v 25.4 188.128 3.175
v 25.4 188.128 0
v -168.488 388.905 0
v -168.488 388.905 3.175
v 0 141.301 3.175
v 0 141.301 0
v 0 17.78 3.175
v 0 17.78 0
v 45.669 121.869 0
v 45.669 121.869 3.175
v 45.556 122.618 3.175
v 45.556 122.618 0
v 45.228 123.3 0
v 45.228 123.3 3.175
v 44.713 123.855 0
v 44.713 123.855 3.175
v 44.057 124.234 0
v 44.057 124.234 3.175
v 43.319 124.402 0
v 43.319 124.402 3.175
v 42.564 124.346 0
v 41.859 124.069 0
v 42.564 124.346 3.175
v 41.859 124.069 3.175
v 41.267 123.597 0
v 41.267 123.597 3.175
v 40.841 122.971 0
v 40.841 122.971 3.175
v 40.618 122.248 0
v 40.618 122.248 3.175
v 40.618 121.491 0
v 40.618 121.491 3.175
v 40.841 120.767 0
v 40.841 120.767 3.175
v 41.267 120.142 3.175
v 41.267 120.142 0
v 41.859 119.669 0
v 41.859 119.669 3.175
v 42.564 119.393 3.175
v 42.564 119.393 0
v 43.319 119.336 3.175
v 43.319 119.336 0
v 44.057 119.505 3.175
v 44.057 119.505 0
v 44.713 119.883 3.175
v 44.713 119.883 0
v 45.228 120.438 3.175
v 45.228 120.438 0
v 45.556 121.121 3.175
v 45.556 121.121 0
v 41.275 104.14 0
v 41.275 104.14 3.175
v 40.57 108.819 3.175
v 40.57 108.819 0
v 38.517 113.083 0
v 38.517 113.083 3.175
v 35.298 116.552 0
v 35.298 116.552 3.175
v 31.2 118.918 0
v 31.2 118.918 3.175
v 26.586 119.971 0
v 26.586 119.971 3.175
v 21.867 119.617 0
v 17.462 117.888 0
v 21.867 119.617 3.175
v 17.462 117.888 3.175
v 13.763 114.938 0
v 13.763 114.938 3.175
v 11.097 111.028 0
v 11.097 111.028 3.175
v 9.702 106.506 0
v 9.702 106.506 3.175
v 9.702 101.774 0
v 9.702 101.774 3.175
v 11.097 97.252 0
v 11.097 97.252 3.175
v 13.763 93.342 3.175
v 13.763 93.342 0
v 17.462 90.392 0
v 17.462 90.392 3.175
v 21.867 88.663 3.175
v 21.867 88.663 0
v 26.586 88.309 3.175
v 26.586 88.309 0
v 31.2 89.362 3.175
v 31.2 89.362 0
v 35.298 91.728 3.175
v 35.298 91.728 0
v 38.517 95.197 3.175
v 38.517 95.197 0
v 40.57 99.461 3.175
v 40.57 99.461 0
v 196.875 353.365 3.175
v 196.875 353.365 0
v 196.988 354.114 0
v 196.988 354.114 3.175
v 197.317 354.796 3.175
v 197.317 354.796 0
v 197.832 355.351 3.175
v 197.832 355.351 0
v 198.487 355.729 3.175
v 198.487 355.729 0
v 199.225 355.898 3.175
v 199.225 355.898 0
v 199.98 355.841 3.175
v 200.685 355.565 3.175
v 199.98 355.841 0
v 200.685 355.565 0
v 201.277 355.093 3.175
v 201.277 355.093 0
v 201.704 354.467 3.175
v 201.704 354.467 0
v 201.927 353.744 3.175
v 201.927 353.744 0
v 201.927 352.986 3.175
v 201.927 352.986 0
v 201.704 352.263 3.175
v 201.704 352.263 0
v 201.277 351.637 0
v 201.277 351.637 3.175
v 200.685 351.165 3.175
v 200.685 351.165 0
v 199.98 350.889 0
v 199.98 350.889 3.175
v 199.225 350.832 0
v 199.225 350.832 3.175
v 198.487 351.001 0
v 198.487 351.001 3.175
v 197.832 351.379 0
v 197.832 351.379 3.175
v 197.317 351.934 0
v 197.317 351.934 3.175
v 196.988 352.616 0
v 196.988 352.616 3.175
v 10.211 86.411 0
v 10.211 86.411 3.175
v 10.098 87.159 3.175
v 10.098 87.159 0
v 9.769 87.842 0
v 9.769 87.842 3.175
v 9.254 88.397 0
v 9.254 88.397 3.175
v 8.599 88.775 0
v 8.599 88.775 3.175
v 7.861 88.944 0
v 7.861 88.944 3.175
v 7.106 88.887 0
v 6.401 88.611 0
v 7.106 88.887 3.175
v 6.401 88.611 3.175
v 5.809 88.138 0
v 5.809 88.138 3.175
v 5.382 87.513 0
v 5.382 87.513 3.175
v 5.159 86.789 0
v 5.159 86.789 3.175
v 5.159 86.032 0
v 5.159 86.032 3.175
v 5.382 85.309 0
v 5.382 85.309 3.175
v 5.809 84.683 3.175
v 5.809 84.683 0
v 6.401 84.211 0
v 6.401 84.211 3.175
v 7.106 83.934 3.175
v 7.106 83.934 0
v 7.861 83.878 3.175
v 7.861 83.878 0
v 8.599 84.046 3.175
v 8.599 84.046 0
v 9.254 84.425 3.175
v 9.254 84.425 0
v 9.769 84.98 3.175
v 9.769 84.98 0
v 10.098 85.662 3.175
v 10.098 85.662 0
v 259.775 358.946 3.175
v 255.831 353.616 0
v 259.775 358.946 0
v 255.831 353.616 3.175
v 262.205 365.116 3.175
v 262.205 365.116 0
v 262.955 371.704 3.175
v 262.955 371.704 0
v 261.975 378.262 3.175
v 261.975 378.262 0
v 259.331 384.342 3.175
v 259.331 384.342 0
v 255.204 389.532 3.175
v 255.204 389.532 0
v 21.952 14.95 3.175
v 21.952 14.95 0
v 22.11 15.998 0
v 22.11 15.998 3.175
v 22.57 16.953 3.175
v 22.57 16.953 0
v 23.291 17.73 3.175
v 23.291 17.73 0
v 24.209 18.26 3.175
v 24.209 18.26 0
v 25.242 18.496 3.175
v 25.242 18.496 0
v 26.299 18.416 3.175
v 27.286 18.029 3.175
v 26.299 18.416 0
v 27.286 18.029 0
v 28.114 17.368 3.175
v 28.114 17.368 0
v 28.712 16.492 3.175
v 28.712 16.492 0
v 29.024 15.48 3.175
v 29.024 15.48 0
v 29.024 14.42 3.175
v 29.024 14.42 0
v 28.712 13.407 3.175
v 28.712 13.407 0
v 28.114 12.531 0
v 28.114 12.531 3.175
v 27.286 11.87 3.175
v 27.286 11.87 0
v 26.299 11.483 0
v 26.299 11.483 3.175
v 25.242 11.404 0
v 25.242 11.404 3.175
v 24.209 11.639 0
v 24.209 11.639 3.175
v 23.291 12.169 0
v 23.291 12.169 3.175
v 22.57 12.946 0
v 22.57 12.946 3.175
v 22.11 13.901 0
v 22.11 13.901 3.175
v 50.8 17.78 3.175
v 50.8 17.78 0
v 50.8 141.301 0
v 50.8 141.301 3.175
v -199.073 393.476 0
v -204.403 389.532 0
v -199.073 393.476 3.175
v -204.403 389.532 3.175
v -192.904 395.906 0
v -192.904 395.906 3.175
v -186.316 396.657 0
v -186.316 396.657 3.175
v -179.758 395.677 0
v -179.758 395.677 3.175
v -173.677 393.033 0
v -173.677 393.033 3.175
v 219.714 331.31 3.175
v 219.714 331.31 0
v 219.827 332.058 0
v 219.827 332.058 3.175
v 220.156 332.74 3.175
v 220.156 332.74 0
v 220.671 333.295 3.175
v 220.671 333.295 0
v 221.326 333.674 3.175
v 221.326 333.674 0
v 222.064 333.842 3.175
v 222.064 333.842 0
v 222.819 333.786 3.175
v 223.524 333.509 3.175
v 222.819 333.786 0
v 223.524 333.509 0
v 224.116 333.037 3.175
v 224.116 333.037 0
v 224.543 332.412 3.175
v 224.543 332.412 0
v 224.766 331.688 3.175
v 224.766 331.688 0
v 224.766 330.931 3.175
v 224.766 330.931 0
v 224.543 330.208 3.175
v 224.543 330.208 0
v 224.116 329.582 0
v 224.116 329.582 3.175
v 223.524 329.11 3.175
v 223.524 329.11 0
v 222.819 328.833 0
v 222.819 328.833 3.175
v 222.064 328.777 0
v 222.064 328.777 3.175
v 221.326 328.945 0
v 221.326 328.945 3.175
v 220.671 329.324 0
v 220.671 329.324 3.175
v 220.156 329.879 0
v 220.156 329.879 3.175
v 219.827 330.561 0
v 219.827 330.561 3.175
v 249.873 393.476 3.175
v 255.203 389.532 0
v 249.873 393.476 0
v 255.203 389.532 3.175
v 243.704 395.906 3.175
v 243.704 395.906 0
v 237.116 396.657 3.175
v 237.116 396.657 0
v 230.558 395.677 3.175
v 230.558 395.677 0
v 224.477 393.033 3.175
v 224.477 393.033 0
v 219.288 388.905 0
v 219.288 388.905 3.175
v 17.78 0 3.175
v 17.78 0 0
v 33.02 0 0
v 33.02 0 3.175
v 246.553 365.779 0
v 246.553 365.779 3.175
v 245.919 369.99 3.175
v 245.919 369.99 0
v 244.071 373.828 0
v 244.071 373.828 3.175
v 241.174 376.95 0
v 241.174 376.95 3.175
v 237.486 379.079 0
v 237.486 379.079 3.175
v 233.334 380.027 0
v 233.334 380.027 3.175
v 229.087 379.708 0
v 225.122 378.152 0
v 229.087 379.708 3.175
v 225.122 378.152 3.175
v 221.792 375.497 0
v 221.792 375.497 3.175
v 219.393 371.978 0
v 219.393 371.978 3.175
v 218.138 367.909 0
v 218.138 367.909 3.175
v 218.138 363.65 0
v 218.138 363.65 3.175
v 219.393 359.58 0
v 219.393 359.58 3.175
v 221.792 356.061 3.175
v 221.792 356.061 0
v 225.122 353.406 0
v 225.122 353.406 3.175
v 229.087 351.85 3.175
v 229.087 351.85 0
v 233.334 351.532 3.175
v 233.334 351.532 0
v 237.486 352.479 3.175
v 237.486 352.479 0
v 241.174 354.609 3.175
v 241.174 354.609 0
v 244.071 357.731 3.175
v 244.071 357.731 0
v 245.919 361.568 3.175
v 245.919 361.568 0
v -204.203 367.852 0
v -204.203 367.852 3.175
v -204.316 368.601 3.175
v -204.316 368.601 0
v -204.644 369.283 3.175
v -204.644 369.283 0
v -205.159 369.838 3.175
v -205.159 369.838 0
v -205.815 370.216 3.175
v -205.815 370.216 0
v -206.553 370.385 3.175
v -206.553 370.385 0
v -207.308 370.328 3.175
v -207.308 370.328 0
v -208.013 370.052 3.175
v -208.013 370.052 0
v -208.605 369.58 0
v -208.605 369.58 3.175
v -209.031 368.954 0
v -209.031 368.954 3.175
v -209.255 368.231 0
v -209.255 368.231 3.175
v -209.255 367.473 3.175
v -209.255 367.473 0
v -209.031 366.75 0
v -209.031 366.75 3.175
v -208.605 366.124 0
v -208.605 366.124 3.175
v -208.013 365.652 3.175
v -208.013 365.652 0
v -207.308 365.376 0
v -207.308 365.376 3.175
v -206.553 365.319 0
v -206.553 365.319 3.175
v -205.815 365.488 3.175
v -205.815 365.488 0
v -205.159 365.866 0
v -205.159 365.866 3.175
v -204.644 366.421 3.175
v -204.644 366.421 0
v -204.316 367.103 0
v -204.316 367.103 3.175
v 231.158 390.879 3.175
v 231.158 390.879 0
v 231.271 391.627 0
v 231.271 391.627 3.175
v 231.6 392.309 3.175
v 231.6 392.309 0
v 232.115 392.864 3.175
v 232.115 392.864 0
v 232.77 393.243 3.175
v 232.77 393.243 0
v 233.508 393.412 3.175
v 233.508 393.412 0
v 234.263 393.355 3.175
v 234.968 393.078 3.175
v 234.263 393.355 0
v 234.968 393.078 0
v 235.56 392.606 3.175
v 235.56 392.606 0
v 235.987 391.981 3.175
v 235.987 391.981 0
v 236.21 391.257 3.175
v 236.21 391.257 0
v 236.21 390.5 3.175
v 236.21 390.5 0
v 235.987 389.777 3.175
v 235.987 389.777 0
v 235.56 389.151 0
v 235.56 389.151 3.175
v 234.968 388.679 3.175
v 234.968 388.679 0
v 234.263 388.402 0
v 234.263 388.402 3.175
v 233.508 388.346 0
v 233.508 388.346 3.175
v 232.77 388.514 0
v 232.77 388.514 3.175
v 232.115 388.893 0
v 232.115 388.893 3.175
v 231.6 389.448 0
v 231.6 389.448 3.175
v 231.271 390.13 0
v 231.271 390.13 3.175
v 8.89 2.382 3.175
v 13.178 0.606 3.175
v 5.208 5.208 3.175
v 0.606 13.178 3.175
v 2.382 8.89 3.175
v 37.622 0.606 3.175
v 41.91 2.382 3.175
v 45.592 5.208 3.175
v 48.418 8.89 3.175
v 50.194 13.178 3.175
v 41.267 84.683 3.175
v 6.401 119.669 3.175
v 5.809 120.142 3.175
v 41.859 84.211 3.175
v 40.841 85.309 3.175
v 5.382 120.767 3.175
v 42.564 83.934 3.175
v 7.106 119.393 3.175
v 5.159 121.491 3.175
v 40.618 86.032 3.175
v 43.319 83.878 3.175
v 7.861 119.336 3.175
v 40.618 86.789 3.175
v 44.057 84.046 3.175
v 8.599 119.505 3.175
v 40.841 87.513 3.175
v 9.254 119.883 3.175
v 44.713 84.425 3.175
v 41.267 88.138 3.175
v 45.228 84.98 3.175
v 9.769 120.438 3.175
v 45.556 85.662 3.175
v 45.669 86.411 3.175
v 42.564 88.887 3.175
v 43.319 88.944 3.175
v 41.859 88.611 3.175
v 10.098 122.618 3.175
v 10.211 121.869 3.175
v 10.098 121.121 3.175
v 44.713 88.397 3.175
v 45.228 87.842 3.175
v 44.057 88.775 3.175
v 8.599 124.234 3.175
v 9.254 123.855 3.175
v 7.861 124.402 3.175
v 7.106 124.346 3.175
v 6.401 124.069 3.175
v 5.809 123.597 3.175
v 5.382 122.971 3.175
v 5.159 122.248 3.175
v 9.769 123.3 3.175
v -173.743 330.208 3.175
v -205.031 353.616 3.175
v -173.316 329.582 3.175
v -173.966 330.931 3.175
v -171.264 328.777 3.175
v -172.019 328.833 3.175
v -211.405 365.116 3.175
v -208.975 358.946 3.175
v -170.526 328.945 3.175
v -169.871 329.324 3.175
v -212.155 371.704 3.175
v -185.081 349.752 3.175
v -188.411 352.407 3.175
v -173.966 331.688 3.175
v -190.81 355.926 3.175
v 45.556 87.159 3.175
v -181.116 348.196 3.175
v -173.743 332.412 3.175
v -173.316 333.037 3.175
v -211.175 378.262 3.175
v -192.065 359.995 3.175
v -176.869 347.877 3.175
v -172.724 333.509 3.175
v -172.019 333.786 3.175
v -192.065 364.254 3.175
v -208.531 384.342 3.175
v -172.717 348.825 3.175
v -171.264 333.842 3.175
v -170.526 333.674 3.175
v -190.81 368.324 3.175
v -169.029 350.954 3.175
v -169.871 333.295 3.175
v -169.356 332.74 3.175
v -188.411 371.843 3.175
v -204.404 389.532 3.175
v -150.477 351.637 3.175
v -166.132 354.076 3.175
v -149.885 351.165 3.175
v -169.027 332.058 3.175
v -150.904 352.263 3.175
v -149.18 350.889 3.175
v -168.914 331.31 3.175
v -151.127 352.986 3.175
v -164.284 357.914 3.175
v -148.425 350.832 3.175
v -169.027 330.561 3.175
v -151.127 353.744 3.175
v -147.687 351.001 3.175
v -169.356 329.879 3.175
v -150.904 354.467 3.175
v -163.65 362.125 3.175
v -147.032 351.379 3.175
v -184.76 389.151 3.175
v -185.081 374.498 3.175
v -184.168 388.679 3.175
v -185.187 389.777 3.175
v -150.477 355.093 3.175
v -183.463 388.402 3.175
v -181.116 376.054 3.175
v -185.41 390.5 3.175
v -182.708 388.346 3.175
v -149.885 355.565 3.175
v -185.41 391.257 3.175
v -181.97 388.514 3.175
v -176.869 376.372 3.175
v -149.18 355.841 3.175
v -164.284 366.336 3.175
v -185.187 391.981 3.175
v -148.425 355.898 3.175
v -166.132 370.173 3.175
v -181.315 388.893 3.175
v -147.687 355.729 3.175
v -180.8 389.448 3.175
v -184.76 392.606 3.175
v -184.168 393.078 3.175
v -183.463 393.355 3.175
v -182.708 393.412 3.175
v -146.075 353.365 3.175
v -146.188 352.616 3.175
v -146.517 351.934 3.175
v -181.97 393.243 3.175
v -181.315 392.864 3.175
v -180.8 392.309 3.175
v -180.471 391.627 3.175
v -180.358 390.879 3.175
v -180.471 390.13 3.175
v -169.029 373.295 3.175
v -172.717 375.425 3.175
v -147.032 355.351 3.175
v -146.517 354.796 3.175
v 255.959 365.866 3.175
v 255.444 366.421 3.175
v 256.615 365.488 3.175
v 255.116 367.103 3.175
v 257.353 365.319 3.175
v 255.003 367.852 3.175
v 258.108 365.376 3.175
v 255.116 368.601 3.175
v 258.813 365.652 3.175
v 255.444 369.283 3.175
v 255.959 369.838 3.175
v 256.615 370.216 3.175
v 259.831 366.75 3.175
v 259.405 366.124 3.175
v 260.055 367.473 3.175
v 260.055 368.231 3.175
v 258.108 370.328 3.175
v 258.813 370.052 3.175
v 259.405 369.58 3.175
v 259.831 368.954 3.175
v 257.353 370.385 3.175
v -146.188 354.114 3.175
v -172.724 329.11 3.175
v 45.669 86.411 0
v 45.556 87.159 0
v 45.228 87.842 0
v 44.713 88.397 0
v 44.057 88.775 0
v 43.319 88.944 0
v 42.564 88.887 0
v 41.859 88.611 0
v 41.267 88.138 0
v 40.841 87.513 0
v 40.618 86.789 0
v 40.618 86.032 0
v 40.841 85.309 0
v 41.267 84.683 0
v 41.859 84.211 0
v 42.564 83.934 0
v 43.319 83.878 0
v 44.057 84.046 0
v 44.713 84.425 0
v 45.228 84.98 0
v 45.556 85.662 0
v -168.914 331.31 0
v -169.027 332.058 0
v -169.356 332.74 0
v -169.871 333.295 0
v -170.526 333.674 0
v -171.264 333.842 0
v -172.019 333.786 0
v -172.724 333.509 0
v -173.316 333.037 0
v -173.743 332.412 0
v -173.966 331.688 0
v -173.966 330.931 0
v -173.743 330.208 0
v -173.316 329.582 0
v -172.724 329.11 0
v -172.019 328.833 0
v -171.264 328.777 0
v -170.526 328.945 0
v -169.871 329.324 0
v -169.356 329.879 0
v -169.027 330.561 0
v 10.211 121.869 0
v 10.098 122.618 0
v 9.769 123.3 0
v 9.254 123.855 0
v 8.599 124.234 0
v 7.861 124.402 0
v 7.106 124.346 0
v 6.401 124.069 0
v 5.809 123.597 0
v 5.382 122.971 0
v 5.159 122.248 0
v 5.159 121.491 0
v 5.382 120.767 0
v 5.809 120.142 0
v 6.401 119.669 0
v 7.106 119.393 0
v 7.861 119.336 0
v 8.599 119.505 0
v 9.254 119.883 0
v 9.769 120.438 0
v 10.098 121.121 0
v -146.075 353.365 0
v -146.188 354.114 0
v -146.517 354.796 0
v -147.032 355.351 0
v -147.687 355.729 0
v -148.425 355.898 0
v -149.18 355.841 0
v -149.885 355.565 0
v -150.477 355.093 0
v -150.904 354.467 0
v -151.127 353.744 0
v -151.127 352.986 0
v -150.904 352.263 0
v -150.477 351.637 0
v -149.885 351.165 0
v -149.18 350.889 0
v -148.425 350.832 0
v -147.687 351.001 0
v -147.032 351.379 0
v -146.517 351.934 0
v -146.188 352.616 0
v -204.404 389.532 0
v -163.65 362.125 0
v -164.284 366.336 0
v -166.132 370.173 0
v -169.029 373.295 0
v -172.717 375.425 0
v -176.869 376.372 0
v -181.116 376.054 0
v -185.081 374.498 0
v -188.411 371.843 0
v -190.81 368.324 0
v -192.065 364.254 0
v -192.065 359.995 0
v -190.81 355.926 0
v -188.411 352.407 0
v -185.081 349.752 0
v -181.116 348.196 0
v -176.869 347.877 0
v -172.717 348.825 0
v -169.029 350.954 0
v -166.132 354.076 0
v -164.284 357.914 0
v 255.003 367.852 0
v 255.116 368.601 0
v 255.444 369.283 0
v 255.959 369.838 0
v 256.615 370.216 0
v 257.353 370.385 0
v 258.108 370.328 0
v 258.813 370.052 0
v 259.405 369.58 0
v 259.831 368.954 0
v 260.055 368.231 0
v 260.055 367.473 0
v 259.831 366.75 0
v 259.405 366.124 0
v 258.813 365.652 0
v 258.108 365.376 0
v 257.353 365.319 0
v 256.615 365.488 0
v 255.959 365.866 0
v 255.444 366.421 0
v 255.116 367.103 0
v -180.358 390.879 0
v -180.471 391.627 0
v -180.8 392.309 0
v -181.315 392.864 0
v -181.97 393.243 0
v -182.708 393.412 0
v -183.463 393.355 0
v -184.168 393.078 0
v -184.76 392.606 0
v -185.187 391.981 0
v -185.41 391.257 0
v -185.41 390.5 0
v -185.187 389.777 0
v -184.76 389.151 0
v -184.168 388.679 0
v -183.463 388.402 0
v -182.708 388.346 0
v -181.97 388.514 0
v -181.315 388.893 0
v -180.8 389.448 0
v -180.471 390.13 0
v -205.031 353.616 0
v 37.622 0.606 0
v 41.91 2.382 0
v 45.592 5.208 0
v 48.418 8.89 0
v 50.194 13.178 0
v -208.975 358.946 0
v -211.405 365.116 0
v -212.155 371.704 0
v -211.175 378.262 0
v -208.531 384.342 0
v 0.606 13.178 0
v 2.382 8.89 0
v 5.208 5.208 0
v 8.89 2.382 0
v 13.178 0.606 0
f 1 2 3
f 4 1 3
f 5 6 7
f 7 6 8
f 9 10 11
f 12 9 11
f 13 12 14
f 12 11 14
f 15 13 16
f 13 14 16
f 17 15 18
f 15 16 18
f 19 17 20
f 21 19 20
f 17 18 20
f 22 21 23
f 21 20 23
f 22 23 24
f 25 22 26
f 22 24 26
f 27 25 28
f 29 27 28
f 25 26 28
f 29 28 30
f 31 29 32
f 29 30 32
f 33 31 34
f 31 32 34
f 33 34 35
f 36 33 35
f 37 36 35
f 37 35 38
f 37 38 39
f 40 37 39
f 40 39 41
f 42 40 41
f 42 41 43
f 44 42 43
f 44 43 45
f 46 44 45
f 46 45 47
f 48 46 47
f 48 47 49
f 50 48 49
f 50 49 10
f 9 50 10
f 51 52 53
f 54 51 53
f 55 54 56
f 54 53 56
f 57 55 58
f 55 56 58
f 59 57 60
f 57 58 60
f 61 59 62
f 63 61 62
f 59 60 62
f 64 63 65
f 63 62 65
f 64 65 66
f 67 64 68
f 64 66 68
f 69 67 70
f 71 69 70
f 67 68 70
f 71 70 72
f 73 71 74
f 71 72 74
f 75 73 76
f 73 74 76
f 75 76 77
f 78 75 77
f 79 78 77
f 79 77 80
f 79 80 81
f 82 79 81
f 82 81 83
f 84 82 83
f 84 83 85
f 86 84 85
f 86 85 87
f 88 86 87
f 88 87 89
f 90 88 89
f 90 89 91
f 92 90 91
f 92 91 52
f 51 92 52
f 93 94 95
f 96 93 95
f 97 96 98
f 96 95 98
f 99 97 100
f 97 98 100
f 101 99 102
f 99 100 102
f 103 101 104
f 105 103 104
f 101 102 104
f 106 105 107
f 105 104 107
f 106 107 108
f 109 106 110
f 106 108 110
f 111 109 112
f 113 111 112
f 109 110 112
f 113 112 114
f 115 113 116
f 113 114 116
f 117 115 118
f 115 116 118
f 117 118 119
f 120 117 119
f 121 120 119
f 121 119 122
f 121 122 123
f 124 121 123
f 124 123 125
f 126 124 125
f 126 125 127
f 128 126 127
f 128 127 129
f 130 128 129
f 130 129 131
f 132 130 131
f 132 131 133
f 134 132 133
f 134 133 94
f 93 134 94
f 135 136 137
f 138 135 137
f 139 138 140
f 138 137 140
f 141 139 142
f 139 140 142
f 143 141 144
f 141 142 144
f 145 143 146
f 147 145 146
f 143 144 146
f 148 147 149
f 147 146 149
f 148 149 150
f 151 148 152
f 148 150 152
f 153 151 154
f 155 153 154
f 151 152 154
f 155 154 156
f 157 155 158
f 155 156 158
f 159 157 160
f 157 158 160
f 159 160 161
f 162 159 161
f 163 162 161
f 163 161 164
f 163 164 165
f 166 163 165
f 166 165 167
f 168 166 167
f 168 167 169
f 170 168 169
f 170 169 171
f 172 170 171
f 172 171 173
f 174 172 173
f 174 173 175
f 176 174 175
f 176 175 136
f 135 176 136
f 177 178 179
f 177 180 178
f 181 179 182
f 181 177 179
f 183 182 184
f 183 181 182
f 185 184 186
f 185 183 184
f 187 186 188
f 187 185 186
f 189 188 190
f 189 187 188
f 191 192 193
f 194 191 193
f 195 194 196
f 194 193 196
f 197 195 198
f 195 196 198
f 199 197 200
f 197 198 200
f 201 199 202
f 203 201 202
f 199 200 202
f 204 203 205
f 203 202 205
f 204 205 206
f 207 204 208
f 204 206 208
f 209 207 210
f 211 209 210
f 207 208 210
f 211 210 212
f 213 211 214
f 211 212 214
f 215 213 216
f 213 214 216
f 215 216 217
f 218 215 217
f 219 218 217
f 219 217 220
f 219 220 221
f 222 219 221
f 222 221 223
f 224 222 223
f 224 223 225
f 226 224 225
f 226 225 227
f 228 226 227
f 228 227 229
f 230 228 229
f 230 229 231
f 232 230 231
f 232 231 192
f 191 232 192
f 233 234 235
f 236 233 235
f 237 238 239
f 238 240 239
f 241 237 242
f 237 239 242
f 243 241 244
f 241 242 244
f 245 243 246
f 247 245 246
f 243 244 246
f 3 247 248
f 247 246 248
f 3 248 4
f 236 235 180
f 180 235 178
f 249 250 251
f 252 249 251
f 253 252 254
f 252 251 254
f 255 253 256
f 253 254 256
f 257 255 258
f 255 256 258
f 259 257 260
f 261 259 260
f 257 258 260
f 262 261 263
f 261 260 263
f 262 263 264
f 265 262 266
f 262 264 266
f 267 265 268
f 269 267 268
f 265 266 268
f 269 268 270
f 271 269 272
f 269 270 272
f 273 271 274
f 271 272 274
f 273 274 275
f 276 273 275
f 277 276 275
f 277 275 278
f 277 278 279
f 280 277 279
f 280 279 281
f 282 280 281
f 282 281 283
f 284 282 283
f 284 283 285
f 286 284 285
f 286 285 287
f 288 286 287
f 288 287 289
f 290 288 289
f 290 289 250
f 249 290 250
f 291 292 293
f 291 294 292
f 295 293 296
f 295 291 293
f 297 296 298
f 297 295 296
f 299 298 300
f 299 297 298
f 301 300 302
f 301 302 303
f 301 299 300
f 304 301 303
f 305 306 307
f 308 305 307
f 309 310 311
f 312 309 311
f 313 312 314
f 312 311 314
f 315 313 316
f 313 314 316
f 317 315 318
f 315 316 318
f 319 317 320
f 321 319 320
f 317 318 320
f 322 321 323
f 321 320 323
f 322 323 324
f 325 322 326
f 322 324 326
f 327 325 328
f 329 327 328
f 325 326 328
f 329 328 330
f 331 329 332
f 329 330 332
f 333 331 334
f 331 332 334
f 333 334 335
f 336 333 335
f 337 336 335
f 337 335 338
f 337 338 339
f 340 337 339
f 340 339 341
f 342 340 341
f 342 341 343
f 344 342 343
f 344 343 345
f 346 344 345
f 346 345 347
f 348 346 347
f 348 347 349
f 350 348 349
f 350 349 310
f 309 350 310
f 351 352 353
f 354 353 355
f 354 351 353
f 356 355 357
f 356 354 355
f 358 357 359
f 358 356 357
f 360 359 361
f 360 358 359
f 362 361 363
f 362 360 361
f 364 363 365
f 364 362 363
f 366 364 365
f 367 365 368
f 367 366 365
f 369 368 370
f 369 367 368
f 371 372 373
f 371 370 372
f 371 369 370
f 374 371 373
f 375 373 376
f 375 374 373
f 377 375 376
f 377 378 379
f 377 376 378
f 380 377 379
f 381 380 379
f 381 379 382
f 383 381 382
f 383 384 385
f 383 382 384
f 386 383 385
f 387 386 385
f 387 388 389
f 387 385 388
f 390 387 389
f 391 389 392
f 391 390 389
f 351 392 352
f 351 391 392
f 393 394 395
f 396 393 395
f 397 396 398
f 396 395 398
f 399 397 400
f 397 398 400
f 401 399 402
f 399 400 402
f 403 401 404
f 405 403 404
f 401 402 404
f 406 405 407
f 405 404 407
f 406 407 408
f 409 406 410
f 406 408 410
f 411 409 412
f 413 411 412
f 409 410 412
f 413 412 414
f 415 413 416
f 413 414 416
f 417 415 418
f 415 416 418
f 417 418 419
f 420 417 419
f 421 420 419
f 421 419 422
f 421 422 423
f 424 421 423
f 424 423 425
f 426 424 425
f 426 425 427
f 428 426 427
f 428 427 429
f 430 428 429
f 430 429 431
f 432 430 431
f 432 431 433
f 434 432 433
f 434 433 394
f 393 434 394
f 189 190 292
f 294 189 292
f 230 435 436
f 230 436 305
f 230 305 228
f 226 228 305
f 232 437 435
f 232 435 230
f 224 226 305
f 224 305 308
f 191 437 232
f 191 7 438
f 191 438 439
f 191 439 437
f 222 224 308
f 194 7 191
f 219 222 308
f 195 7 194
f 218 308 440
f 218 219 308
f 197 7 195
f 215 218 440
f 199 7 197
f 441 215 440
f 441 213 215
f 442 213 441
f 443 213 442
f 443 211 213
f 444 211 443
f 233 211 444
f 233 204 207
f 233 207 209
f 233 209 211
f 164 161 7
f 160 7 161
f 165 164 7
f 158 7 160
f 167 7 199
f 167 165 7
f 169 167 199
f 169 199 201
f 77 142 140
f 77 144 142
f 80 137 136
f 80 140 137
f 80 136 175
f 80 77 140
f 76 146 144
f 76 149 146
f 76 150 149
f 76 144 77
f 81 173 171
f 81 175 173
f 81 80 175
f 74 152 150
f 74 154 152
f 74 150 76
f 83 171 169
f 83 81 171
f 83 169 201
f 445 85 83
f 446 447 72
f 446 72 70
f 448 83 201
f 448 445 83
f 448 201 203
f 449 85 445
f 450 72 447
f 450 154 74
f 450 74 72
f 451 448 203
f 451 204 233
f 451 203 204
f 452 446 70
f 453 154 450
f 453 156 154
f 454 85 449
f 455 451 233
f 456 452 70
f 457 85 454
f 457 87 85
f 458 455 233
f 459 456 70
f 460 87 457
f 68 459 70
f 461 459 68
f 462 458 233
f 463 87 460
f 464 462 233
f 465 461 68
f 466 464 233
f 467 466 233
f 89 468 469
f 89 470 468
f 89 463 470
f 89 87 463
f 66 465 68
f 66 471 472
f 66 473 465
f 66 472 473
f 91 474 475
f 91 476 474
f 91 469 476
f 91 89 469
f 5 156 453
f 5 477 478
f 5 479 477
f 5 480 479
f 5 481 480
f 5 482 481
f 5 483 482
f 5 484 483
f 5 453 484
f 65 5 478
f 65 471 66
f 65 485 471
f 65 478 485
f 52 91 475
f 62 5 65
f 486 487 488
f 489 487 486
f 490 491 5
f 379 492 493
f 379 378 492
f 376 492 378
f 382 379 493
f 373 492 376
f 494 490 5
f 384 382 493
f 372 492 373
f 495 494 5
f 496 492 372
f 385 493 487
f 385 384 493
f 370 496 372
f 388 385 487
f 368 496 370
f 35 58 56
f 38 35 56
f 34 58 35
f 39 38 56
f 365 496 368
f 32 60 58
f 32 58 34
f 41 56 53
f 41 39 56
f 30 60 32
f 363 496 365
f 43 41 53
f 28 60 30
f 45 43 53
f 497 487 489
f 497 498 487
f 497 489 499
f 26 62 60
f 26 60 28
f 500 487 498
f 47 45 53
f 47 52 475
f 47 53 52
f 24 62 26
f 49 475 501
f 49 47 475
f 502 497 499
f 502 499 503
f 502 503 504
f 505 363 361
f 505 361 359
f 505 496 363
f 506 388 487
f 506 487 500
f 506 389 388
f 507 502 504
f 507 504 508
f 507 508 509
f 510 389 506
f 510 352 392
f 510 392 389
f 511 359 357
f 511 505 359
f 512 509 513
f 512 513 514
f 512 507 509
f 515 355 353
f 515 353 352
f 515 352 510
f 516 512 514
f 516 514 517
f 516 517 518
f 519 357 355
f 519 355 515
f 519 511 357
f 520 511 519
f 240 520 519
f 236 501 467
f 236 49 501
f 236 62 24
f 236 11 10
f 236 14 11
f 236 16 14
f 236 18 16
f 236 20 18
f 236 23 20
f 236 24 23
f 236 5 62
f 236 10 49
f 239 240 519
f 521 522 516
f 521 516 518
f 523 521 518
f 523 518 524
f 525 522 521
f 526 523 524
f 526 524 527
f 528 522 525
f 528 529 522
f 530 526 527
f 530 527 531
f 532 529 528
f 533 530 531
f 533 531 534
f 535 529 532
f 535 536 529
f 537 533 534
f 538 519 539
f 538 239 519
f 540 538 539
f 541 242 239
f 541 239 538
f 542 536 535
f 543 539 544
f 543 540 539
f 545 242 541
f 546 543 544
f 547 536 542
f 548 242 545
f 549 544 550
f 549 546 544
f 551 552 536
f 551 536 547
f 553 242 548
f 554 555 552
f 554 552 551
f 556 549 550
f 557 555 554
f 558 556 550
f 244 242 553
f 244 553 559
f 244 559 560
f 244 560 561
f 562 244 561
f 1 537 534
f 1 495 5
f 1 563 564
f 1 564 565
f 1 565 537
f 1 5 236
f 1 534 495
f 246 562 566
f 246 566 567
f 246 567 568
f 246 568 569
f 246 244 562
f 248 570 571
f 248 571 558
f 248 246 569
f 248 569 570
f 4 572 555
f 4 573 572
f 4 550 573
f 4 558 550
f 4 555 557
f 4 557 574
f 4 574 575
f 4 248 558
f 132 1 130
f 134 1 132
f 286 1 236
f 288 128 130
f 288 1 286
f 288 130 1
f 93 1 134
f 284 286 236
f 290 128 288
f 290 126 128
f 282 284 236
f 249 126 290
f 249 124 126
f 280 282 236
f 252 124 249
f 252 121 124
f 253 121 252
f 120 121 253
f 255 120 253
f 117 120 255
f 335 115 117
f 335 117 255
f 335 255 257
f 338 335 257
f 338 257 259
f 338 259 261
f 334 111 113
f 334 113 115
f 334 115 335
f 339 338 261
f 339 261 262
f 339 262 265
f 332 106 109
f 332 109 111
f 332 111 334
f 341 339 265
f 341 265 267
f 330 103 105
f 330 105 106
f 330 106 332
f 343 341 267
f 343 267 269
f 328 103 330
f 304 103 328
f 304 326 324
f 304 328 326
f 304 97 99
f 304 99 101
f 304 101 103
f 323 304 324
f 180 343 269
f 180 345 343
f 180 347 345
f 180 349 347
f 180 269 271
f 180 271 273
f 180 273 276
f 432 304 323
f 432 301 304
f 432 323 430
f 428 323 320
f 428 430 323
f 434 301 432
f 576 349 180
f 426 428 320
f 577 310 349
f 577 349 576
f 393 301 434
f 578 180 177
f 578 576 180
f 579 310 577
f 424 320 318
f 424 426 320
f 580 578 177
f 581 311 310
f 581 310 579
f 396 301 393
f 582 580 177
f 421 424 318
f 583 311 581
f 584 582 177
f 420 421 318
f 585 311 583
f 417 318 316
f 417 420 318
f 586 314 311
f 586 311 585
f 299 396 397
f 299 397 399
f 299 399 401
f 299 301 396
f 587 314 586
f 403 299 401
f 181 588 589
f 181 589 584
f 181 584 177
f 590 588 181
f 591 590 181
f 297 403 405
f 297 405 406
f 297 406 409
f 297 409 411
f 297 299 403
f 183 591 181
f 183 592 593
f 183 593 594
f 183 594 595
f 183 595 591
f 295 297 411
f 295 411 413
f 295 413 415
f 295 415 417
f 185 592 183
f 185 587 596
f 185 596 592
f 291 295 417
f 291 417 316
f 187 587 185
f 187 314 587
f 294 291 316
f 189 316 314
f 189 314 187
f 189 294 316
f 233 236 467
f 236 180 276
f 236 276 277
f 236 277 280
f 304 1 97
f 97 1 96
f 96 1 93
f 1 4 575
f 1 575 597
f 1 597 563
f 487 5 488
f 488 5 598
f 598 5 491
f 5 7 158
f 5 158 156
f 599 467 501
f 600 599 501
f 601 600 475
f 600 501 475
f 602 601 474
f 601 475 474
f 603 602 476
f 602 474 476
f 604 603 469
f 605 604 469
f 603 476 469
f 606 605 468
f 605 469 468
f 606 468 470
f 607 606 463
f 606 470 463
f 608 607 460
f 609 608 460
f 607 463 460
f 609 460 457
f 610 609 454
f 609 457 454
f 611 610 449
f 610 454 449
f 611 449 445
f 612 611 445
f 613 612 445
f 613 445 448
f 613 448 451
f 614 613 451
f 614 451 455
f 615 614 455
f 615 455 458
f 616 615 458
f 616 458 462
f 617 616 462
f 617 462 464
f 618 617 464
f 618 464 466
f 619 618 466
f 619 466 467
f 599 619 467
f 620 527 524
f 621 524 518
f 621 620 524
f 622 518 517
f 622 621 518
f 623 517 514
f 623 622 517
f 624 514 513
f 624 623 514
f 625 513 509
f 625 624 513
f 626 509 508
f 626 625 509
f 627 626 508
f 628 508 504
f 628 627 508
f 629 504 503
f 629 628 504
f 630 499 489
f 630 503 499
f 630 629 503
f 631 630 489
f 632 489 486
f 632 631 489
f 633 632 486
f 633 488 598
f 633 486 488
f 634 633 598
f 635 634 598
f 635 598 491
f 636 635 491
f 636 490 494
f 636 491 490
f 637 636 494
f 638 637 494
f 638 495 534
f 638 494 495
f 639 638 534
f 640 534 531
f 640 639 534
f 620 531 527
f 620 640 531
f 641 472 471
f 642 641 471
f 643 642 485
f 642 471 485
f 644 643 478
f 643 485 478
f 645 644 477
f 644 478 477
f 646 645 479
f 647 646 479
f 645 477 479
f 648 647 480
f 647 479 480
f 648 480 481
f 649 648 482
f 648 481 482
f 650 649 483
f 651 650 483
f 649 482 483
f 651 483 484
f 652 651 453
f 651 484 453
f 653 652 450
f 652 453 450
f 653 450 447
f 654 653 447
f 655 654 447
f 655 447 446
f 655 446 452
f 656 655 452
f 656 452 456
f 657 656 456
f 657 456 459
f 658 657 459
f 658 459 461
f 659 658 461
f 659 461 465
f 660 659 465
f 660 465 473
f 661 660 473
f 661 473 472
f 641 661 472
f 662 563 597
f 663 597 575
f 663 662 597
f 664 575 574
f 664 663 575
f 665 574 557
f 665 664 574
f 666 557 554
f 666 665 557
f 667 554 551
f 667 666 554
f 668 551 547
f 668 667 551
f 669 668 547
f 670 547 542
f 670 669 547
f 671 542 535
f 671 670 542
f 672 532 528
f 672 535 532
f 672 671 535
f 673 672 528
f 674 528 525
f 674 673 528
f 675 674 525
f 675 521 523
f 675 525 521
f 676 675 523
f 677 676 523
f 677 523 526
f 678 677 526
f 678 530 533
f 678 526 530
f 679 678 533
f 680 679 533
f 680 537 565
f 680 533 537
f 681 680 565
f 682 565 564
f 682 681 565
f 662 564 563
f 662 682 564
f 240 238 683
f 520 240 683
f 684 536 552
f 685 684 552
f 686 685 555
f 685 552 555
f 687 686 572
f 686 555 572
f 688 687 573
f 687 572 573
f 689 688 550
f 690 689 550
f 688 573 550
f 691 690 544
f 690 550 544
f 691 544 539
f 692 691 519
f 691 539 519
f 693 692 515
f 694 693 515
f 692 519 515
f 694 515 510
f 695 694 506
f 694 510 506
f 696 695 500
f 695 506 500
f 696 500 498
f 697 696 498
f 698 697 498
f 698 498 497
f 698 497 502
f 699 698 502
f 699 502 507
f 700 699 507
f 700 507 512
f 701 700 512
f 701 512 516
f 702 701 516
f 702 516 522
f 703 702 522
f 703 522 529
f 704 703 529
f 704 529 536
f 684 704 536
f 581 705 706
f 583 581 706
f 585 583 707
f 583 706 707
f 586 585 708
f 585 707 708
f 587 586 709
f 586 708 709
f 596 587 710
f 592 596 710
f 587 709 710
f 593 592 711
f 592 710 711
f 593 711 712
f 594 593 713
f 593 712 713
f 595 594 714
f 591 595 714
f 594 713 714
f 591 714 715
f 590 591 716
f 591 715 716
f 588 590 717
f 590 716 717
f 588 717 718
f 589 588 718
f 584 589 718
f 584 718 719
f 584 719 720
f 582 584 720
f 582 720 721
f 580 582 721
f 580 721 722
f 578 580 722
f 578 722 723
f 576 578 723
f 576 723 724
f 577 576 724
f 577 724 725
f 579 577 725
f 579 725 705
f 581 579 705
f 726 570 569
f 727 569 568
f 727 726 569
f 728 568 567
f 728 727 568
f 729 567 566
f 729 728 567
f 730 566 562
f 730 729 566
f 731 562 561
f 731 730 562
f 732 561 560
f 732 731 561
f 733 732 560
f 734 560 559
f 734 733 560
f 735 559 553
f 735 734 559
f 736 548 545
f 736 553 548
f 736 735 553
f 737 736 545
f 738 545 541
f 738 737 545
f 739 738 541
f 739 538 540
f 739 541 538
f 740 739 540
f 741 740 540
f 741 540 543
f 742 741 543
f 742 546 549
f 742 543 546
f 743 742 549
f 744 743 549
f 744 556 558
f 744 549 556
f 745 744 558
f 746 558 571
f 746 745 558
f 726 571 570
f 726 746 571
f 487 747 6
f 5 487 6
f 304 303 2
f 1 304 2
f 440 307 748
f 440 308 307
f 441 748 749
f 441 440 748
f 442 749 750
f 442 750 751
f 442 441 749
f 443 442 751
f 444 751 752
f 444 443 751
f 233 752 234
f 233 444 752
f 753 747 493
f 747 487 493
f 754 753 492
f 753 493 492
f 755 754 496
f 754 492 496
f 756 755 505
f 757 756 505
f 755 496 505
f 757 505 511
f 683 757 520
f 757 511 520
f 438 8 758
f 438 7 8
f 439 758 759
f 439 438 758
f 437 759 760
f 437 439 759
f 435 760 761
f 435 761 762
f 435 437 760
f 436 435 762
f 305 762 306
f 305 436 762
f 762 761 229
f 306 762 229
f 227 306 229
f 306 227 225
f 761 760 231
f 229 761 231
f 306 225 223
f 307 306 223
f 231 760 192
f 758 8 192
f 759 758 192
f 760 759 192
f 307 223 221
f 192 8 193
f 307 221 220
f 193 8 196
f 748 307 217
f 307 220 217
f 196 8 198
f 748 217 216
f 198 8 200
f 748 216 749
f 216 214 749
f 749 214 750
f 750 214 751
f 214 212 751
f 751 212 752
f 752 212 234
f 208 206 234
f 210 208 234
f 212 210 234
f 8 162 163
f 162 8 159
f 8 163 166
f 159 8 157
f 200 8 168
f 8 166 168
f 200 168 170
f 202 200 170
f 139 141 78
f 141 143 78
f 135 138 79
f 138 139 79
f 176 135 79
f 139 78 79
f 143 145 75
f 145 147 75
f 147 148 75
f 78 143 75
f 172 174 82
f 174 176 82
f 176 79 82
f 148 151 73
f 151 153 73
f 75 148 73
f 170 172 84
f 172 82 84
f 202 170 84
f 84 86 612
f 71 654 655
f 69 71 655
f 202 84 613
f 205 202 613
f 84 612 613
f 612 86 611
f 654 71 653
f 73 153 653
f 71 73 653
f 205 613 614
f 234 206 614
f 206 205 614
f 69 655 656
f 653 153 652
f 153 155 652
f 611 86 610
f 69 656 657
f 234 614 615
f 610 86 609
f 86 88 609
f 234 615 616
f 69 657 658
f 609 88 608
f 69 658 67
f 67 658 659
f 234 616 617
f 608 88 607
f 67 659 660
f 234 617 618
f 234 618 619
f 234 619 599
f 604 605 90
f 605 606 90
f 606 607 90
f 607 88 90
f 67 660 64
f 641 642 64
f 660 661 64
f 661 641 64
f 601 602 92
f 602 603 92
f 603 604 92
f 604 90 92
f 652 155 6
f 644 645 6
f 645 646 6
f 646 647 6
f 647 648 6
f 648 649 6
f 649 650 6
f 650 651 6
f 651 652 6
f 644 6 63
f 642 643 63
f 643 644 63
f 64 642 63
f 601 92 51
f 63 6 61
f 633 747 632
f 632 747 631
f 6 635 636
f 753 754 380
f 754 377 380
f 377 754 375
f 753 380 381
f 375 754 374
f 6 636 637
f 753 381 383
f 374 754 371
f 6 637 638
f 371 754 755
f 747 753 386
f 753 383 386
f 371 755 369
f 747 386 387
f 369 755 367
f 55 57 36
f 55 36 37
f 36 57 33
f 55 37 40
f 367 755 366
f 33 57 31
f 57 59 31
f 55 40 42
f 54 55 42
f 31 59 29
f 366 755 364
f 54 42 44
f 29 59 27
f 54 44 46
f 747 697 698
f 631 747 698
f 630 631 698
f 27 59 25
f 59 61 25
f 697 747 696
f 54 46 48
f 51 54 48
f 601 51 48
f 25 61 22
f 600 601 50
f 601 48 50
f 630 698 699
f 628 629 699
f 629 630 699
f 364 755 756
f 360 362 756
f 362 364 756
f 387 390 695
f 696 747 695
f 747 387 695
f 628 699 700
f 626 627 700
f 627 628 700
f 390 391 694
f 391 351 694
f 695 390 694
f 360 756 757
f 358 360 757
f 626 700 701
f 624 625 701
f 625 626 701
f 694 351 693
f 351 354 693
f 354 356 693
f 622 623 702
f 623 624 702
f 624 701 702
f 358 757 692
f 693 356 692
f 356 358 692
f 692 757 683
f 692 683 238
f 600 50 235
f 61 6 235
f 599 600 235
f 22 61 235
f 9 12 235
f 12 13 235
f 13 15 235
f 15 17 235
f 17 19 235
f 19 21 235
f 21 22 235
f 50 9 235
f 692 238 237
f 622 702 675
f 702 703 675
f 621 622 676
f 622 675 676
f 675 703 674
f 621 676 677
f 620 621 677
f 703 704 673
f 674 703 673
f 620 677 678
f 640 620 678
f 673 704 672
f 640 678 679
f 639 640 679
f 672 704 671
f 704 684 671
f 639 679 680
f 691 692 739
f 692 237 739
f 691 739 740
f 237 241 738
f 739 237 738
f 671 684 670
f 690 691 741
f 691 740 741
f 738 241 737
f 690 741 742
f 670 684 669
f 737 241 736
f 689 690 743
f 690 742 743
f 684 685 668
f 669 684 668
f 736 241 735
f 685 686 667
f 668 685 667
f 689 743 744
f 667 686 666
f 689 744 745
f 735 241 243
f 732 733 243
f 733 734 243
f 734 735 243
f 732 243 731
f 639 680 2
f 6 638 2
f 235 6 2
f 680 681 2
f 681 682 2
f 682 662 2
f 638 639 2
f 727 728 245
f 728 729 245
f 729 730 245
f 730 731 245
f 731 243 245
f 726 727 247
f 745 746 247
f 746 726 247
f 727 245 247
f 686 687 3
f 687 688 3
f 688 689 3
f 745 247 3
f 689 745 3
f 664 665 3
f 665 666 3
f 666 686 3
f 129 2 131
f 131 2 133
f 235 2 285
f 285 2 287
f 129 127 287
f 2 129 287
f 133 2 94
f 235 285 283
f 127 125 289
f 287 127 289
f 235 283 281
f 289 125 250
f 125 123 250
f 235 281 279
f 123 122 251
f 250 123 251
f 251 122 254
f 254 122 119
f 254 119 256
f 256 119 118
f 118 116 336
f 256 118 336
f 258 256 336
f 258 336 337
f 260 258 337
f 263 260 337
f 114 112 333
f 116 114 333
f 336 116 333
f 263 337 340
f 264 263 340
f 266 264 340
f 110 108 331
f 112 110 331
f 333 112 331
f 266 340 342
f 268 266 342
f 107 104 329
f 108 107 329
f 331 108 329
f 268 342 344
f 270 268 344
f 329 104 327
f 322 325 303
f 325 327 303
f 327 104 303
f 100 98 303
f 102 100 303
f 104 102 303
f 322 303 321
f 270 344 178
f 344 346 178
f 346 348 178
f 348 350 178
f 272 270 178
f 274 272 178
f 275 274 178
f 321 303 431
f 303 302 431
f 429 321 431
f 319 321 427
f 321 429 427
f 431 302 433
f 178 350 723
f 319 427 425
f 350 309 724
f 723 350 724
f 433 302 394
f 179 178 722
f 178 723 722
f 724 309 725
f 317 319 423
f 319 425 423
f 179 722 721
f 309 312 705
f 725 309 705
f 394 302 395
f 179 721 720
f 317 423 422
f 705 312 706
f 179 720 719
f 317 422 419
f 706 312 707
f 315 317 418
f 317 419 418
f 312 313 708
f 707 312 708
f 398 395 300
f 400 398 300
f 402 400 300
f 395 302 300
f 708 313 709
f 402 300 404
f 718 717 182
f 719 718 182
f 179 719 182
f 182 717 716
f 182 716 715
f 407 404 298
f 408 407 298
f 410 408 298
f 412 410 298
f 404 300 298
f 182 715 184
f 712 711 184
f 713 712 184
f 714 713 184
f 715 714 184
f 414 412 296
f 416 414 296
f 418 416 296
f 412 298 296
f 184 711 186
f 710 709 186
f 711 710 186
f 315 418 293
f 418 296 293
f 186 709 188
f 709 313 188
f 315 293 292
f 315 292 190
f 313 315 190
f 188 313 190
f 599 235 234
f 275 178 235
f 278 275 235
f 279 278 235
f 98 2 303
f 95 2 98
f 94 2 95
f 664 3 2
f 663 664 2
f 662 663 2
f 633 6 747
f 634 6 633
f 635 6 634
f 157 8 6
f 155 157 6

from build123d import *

# Parameters (mm, degrees)
BOSS_EXTRUDE1_DEPTH = 3.175
SKETCH2_R           = 14.2875
SKETCH2_R_2         = 15.875
SKETCH2_R_3         = 2.54
CUT_EXTRUDE1_DEPTH  = 491.500657373
FILLET1_R           = 25.4
SKETCH7_R           = 3.556
CUT_EXTRUDE6_DEPTH  = 476.917284882
FILLET2_R           = 17.78
FILLET3_R           = 17.78
SKETCH9_R           = 2.54
CUT_EXTRUDE7_DEPTH  = 476.917284882


with BuildPart() as part:
    # Sketch1 → Boss-Extrude1 (new body)
    with BuildSketch(Plane.XY):
        Polygon((0, 0), (50.8, 0), (50.8, 141.300925348), (273.474793589, 371.887424227), (236.932331732, 407.176069446), (25.4, 188.127927591), (-186.132331732, 407.176069446), (-222.674793589, 371.887424227), (0, 141.300925348), align=None)
    extrude(amount=BOSS_EXTRUDE1_DEPTH)

    # Sketch2 → Cut-Extrude1 (cut, through all)
    with BuildSketch(Plane.XY.offset(3.175)):
        with Locations((232.265943268, 365.779146629)):
            Circle(SKETCH2_R)
        with Locations((-177.937078746, 362.124900444)):
            Circle(SKETCH2_R)
        with Locations((25.4, 104.14)):
            Circle(SKETCH2_R_2)
        with Locations((43.1292, 121.8692)):
            Circle(SKETCH2_R_3)
        with Locations((7.6708, 121.8692)):
            Circle(SKETCH2_R_3)
        with Locations((7.6708, 86.4108)):
            Circle(SKETCH2_R_3)
        with Locations((43.1292, 86.4108)):
            Circle(SKETCH2_R_3)
    extrude(amount=-CUT_EXTRUDE1_DEPTH, mode=Mode.SUBTRACT)

    # Fillet1
    fillet1_edges = [part.edges().sort_by_distance(p)[0] for p in [
        (273.474793589, 371.887424227, 1.5875),
        (236.932331732, 407.176069446, 1.5875),
        (-222.674793589, 371.887424227, 1.5875),
        (-186.132331732, 407.176069446, 1.5875),
    ]]
    fillet(fillet1_edges, radius=FILLET1_R - 0.0001)  # a hair under: the kernel refuses the full size

    # Sketch7 → Cut-Extrude6 (cut, through all)
    with BuildSketch(Plane(origin=(0, 0, 0), x_dir=(-1, 0, 0), z_dir=(0, 0, -1))):
        with Locations((-25.507732434, 14.949579081)):
            Circle(SKETCH7_R)
    extrude(amount=-CUT_EXTRUDE6_DEPTH, mode=Mode.SUBTRACT)

    # Fillet2
    fillet2_edges = [part.edges().sort_by_distance(p)[0] for p in [
        (0, 0, 1.5875),
    ]]
    fillet(fillet2_edges, radius=FILLET2_R)

    # Fillet3
    fillet3_edges = [part.edges().sort_by_distance(p)[0] for p in [
        (50.8, 0, 1.5875),
    ]]
    fillet(fillet3_edges, radius=FILLET3_R)

    # Sketch9 → Cut-Extrude7 (cut, through all)
    with BuildSketch(Plane(origin=(0, 0, 0), x_dir=(-1, 0, 0), z_dir=(0, 0, -1))):
        with Locations((-233.698211642, 390.878637547)):
            Circle(SKETCH9_R)
        with Locations((-257.542931638, 367.852059109)):
            Circle(SKETCH9_R)
        with Locations((-199.415247758, 353.365000514)):
            Circle(SKETCH9_R)
        with Locations((-222.254286418, 331.309597252)):
            Circle(SKETCH9_R)
    cut_extrude7 = extrude(amount=-CUT_EXTRUDE7_DEPTH, mode=Mode.SUBTRACT)

    # Mirror3: Cut-Extrude7 across plane
    add(cut_extrude7.mirror(Plane.ZY.offset(-25.4)), mode=Mode.SUBTRACT)


solid = part.part
